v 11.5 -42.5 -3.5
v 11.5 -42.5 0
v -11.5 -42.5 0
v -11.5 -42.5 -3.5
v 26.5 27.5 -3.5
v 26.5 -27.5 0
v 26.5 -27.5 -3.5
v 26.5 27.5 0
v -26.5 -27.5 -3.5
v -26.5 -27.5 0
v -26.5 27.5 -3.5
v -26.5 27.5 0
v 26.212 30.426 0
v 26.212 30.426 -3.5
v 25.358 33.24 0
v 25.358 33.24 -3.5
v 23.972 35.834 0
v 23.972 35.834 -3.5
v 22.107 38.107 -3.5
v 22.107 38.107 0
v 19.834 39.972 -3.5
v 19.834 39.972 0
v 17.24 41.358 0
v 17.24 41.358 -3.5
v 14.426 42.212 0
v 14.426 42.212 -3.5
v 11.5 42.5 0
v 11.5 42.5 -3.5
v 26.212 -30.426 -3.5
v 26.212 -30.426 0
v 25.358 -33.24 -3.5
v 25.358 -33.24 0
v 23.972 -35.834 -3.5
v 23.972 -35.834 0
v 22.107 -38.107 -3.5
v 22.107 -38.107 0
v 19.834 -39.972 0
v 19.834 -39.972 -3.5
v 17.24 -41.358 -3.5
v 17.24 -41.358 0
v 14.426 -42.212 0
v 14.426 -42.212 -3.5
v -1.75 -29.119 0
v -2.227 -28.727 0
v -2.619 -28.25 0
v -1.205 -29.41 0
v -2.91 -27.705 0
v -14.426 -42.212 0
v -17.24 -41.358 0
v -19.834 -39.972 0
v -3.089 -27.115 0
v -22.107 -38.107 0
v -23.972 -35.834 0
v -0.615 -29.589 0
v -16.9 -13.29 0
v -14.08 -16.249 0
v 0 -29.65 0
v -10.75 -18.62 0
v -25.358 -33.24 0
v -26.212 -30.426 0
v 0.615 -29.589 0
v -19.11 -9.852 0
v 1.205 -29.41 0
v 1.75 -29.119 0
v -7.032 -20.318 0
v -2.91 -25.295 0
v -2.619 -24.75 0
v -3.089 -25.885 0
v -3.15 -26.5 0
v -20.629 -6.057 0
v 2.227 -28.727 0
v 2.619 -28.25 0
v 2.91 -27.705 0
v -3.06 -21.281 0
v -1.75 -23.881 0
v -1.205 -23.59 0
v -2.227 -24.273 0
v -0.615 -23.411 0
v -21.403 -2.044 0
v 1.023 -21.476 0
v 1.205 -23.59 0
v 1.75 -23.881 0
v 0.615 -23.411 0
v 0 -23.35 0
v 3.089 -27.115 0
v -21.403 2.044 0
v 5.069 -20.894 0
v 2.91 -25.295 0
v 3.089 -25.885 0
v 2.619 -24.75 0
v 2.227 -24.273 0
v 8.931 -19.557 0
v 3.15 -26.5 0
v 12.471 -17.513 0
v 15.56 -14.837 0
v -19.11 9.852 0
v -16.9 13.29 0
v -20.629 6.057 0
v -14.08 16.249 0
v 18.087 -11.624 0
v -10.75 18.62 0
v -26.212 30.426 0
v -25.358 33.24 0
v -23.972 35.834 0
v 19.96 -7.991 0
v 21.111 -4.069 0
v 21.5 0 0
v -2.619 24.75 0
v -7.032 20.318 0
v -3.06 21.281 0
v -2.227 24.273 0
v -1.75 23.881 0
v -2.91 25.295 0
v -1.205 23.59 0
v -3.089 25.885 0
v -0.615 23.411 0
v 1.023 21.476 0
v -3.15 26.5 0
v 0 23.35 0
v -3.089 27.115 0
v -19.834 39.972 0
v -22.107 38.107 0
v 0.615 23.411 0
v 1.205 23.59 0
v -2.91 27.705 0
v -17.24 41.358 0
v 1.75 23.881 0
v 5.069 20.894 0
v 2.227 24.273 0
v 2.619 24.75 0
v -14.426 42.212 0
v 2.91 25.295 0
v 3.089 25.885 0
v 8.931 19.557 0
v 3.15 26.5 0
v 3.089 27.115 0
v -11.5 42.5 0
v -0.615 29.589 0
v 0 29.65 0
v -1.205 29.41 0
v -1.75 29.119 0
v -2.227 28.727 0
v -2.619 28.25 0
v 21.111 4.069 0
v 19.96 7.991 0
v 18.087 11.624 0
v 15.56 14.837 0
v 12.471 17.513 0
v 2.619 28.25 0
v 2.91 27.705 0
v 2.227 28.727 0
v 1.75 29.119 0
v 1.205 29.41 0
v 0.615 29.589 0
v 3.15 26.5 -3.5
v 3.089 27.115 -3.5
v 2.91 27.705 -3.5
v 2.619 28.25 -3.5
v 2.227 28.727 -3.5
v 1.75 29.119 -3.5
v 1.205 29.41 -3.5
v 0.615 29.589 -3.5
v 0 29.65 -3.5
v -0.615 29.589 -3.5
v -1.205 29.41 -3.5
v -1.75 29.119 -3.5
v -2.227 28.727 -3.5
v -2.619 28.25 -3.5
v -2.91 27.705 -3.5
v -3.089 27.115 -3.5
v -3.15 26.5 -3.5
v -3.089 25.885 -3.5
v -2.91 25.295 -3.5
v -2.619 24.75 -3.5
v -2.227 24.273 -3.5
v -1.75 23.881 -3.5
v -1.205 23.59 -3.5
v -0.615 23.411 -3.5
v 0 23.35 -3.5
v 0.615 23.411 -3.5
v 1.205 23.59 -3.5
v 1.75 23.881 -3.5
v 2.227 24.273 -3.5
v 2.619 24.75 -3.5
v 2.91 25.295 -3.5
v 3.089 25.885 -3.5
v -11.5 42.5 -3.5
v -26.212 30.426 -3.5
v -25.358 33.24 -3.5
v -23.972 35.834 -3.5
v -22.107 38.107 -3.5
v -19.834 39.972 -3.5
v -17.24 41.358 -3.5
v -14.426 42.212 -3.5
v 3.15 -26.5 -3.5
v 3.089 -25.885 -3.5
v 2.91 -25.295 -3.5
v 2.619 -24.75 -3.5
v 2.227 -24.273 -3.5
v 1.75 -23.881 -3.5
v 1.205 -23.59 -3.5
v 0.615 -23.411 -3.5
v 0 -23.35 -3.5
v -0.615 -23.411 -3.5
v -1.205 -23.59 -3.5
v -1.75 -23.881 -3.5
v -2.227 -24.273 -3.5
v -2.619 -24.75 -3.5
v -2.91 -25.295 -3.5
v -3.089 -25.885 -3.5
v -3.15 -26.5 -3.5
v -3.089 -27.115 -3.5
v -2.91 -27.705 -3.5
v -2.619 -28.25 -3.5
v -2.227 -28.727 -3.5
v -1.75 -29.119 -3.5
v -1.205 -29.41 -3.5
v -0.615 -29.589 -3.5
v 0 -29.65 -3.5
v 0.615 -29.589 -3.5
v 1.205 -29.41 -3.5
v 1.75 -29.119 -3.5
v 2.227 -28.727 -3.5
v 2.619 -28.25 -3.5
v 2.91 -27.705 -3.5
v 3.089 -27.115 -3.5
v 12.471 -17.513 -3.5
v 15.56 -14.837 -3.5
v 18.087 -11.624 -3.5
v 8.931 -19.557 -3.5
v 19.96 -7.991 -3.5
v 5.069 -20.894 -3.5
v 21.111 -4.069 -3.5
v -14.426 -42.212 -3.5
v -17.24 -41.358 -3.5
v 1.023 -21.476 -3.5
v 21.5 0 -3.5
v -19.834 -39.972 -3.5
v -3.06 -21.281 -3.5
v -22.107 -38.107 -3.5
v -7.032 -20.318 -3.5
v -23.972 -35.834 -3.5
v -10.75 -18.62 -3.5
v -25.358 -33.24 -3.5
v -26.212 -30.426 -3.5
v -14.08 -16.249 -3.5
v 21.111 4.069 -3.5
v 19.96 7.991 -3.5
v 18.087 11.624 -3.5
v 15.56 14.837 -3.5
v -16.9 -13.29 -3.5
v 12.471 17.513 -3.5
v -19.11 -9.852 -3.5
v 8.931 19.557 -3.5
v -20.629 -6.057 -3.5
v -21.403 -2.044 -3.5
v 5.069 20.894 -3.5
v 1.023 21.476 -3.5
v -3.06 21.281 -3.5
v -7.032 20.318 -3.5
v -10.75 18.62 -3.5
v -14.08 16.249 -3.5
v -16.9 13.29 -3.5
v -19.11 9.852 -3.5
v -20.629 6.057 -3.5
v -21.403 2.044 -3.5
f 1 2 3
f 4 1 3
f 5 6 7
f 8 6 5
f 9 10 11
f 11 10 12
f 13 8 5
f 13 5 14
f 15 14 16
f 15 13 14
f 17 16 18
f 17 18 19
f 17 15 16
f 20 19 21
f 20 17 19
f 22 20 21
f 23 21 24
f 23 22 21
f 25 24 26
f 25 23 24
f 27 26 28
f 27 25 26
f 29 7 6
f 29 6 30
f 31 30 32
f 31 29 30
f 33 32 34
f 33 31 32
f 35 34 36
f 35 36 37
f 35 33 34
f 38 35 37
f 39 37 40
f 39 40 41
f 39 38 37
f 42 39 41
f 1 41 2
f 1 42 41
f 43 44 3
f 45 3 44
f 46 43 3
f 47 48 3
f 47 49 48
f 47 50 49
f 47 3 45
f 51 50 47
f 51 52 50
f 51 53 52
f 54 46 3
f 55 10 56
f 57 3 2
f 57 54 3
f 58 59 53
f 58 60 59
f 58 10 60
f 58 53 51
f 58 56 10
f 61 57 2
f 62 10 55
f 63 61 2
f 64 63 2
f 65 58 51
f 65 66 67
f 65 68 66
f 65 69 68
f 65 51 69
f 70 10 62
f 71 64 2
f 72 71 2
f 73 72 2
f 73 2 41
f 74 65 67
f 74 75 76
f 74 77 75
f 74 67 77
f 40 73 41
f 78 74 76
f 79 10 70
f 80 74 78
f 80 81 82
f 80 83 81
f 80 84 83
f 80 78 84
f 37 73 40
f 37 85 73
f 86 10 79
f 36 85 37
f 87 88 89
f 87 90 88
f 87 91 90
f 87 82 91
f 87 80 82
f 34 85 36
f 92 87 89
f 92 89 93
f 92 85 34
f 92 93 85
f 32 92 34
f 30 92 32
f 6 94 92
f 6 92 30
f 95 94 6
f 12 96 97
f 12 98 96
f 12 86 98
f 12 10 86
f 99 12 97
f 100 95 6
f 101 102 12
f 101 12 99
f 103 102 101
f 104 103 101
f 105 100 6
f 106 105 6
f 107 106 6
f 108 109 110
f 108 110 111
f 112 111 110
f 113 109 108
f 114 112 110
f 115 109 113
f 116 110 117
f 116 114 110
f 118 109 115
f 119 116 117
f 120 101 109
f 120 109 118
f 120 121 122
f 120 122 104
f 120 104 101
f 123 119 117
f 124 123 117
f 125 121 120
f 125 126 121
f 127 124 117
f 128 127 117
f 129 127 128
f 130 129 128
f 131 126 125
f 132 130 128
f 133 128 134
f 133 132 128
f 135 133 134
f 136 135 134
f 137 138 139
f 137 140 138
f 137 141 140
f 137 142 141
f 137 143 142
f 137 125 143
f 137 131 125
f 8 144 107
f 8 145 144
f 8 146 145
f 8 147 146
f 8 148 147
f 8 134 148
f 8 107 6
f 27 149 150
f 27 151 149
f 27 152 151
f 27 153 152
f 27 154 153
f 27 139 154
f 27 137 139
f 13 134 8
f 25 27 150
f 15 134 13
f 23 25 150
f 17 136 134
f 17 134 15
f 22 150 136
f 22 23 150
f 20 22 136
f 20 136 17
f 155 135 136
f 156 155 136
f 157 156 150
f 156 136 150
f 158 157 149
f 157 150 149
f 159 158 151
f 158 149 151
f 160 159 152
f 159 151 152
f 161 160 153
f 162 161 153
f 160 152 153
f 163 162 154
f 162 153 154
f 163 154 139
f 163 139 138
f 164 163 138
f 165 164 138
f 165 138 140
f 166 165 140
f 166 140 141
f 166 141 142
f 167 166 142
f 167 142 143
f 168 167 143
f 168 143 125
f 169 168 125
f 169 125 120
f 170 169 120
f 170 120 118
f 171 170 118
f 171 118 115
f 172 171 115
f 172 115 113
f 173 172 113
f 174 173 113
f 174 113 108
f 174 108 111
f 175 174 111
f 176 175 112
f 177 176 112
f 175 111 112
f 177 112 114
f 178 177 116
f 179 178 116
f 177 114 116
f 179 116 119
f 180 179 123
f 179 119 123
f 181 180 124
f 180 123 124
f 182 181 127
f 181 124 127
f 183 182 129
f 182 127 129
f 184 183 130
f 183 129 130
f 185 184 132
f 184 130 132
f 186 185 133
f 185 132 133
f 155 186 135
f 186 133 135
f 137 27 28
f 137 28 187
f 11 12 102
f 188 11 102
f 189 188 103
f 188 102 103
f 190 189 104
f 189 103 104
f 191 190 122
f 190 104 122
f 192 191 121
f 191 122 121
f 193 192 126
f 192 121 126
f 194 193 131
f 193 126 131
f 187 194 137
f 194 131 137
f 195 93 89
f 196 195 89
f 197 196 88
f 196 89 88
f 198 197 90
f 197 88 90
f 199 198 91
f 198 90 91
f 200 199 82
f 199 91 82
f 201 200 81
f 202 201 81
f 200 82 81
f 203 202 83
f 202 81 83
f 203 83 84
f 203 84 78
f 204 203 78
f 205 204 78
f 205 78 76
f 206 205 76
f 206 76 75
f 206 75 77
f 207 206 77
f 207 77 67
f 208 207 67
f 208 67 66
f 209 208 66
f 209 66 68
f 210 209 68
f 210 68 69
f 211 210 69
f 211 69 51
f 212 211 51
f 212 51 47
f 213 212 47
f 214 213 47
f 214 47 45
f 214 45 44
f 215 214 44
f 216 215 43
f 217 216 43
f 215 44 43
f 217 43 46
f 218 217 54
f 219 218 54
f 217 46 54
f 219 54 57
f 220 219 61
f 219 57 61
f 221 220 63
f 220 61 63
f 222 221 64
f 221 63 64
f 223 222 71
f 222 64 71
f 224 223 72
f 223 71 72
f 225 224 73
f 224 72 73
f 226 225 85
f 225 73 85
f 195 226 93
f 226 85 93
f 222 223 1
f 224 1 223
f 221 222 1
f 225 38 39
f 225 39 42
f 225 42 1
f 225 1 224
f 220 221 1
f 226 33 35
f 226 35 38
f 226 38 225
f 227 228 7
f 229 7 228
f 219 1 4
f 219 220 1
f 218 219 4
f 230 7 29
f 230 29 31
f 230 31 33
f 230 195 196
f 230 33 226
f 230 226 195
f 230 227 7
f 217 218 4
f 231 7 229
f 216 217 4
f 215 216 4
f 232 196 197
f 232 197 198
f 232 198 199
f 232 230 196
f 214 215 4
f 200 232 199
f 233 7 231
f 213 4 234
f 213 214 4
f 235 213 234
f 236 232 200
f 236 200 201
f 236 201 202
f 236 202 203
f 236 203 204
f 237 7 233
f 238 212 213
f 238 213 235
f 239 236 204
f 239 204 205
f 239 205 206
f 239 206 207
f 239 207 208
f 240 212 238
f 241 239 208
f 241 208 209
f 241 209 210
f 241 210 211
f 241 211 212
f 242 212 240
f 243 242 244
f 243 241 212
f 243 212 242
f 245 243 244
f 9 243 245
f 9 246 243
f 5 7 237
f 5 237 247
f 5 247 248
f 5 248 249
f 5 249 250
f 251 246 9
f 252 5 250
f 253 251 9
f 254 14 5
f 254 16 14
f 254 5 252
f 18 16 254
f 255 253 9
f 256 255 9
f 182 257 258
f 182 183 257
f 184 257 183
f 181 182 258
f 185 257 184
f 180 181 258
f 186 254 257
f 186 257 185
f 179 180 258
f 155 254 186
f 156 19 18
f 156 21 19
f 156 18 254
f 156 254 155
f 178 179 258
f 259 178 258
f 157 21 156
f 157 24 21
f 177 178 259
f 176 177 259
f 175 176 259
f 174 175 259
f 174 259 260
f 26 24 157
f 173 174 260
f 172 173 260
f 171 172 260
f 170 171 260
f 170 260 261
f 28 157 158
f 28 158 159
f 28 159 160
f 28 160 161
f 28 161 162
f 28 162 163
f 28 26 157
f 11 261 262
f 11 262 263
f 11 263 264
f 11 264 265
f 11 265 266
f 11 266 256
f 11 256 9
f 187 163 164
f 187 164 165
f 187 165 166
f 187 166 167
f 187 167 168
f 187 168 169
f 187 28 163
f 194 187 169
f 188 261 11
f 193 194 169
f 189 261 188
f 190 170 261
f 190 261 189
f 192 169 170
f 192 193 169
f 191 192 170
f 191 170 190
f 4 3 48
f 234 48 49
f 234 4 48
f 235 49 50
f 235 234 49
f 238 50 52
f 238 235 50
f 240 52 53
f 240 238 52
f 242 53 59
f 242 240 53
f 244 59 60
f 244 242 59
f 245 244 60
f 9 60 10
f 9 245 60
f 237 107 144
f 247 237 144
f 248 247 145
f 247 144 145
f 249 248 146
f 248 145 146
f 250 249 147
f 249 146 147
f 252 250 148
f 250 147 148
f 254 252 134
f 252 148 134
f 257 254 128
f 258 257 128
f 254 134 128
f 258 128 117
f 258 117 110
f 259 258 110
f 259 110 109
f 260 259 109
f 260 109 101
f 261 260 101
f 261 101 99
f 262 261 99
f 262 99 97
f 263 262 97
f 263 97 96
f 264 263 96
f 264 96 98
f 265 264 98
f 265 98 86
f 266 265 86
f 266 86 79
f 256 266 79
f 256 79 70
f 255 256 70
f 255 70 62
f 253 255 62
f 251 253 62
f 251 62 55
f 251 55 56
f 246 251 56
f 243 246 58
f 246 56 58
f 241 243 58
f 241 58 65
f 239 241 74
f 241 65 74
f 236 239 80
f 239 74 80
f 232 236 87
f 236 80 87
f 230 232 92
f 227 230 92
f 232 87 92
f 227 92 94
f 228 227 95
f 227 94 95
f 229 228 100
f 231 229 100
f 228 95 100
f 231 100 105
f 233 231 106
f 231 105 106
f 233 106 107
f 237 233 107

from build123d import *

# Parameters (mm, degrees)
BOSS_EXTRUDE1_DEPTH = 5
SKETCH4_W           = 53
SKETCH4_H           = 85
BOSS_EXTRUDE2_DEPTH = 3.5
SKETCH2_R           = 21.5
CUT_EXTRUDE1_DEPTH  = 74.391075752
SKETCH3_R           = 3.15
CUT_EXTRUDE2_DEPTH  = 74.391075752
SKETCH16_W          = 82.074163125
SKETCH16_H          = 140.053159095
SKETCH16_W_2        = 53
SKETCH16_H_2        = 85
LAZY_CUT_DEPTH      = 74.068461049
FILLET1_R           = 15
SKETCH17_W          = 53
SKETCH17_H          = 5
CUT_EXTRUDE7_DEPTH  = 90.175388981
SKETCH12_R          = 2.9
CUT_EXTRUDE3_DEPTH  = 3
SKETCH13_R          = 1.75
CUT_EXTRUDE4_DEPTH  = 51.386009963
CUT_EXTRUDE5_DEPTH  = 3
CUT_EXTRUDE6_DEPTH  = 1.5


with BuildPart() as part:
    # Sketch1 → Boss-Extrude1 (new body)
    with BuildSketch(Plane.XY):
        with BuildLine():
            Line((25, 65), (-25, 65))
            ThreePointArc((-25, 65), (-30.656854249, 62.656854249), (-33, 57))
            Line((-33, 57), (-33, -57))
            ThreePointArc((-33, -57), (-30.656854249, -62.656854249), (-25, -65))
            Line((-25, -65), (25, -65))
            ThreePointArc((25, -65), (30.656854249, -62.656854249), (33, -57))
            Line((33, -57), (33, 57))
            ThreePointArc((33, 57), (30.656854249, 62.656854249), (25, 65))
        make_face()
    extrude(amount=BOSS_EXTRUDE1_DEPTH)

    # Sketch4 → Boss-Extrude2 (add)
    with BuildSketch(Plane(origin=(0, 0, 0), x_dir=(-1, 0, 0), z_dir=(0, 0, -1))):
        Rectangle(SKETCH4_W, SKETCH4_H)
    extrude(amount=BOSS_EXTRUDE2_DEPTH)

    # Sketch2 → Cut-Extrude1 (cut, through all)
    with BuildSketch(Plane.XY.offset(5)):
        Circle(SKETCH2_R)
    extrude(amount=-CUT_EXTRUDE1_DEPTH, mode=Mode.SUBTRACT)

    # Sketch3 → Cut-Extrude2 (cut, through all)
    with BuildSketch(Plane.XY.offset(5)):
        with Locations((0, 26.5)):
            Circle(SKETCH3_R)
        with Locations((0, -26.5)):
            Circle(SKETCH3_R)
    extrude(amount=-CUT_EXTRUDE2_DEPTH, mode=Mode.SUBTRACT)

    # Sketch16 → lazy cut (cut, through all)
    with BuildSketch(Plane(origin=(0, 0, 0), x_dir=(-1, 0, 0), z_dir=(0, 0, -1))):
        with Locations((0.978866165, -0.150594795)):
            Rectangle(SKETCH16_W, SKETCH16_H)
        Rectangle(SKETCH16_W_2, SKETCH16_H_2, mode=Mode.SUBTRACT)
    extrude(amount=-LAZY_CUT_DEPTH, mode=Mode.SUBTRACT)

    # Fillet1
    fillet1_edges = [part.edges().sort_by_distance(p)[0] for p in [
        (-26.5, -42.5, 0.75),
        (-26.5, 42.5, 0.75),
        (26.5, 42.5, 0.75),
        (26.5, -42.5, 0.75),
    ]]
    fillet(fillet1_edges, radius=FILLET1_R)

    # Sketch17 → Cut-Extrude7 (cut, through all)
    with BuildSketch(Plane(origin=(0, 42.5, 0), x_dir=(1, 0, 0), z_dir=(0, 1, 0))):
        with Locations((0, -2.5)):
            Rectangle(SKETCH17_W, SKETCH17_H)
    extrude(amount=-CUT_EXTRUDE7_DEPTH, mode=Mode.SUBTRACT)

    # Sketch12 → Cut-Extrude3 (cut)
    with BuildSketch(Plane.XY.offset(5)):
        with Locations((-27.75, 59.75)):
            Circle(SKETCH12_R)
        with Locations((27.75, 59.75)):
            Circle(SKETCH12_R)
        with Locations((-27.75, -59.75)):
            Circle(SKETCH12_R)
        with Locations((27.75, -59.75)):
            Circle(SKETCH12_R)
    extrude(amount=-CUT_EXTRUDE3_DEPTH, mode=Mode.SUBTRACT)

    # Sketch13 → Cut-Extrude4 (cut, through all)
    with BuildSketch(Plane.XY.offset(2)):
        with Locations((-27.75, 59.75)):
            Circle(SKETCH13_R)
        with Locations((27.75, 59.75)):
            Circle(SKETCH13_R)
        with Locations((27.75, -59.75)):
            Circle(SKETCH13_R)
        with Locations((-27.75, -59.75)):
            Circle(SKETCH13_R)
    extrude(amount=-CUT_EXTRUDE4_DEPTH, mode=Mode.SUBTRACT)

    # Sketch14 → Cut-Extrude5 (cut)
    with BuildSketch(Plane.XY.offset(5)):
        with BuildLine():
            Line((-5.5, 26.5), (-5.5, -26.5))
            ThreePointArc((-5.5, -26.5), (0, -32), (5.5, -26.5))
            Line((5.5, -26.5), (5.5, 26.5))
            ThreePointArc((5.5, 26.5), (0, 32), (-5.5, 26.5))
        make_face()
    extrude(amount=-CUT_EXTRUDE5_DEPTH, mode=Mode.SUBTRACT)

    # Sketch15 → Cut-Extrude6 (cut)
    with BuildSketch(Plane.XY.offset(5)):
        with BuildLine():
            Line((-2.5, 65), (-2.5, 31.398979486))
            ThreePointArc((-2.5, 31.398979486), (0, 32), (2.5, 31.398979486))
            Line((2.5, 31.398979486), (2.5, 65))
            Line((2.5, 65), (-2.5, 65))
        make_face()
        with BuildLine():
            Line((-27.75, 13.75), (-20.879116361, 13.75))
            ThreePointArc((-20.879116361, 13.75), (-14.747047157, 20.187238547), (-6.75, 24.071508054))
            Line((-6.75, 24.071508054), (-6.75, 59.75))
            Line((-6.75, 59.75), (-21.75, 59.75))
            ThreePointArc((-21.75, 59.75), (-23.507359313, 55.507359313), (-27.75, 53.75))
            Line((-27.75, 53.75), (-27.75, 13.75))
        make_face()
        with BuildLine():
            Line((27.75, 13.75), (20.879116361, 13.75))
            ThreePointArc((20.879116361, 13.75), (14.747047157, 20.187238547), (6.75, 24.071508054))
            Line((6.75, 24.071508054), (6.75, 59.75))
            Line((6.75, 59.75), (21.75, 59.75))
            ThreePointArc((21.75, 59.75), (23.507359313, 55.507359313), (27.75, 53.75))
            Line((27.75, 53.75), (27.75, 13.75))
        make_face()
        with BuildLine():
            Line((27.75, -53.75), (27.75, -13.75))
            Line((27.75, -13.75), (20.879116361, -13.75))
            ThreePointArc((20.879116361, -13.75), (14.747047157, -20.187238547), (6.75, -24.071508054))
            Line((6.75, -24.071508054), (6.75, -59.75))
            Line((6.75, -59.75), (21.75, -59.75))
            ThreePointArc((21.75, -59.75), (23.507359313, -55.507359313), (27.75, -53.75))
        make_face()
        with BuildLine():
            Line((2.5, -65), (2.5, -31.398979486))
            ThreePointArc((2.5, -31.398979486), (0, -32), (-2.5, -31.398979486))
            Line((-2.5, -31.398979486), (-2.5, -65))
            Line((-2.5, -65), (2.5, -65))
        make_face()
        with BuildLine():
            Line((-6.75, -59.75), (-6.75, -24.071508054))
            ThreePointArc((-6.75, -24.071508054), (-14.747047157, -20.187238547), (-20.879116361, -13.75))
            Line((-20.879116361, -13.75), (-27.75, -13.75))
            Line((-27.75, -13.75), (-27.75, -53.75))
            ThreePointArc((-27.75, -53.75), (-23.507359313, -55.507359313), (-21.75, -59.75))
            Line((-21.75, -59.75), (-6.75, -59.75))
        make_face()
    extrude(amount=-CUT_EXTRUDE6_DEPTH, mode=Mode.SUBTRACT)


solid = part.part
